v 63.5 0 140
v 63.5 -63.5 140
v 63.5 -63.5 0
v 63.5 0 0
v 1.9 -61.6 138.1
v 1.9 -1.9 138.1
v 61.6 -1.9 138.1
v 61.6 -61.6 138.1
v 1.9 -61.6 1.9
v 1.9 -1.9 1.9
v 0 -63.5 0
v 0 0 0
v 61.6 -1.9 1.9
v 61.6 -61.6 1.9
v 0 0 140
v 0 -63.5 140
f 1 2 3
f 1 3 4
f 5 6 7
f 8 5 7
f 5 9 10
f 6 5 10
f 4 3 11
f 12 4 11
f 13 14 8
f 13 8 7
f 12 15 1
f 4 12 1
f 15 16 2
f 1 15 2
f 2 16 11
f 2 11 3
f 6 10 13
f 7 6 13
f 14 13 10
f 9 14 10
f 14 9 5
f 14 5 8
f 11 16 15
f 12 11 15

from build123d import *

# Parameters (mm, degrees)
CROQUIS1_W              = 63.5
CROQUIS1_H              = 63.5
CROQUIS1_W_2            = 59.7
CROQUIS1_H_2            = 59.7
SALIENTE_EXTRUIR1_DEPTH = 140
CROQUIS2_W              = 59.7
CROQUIS2_H              = 59.7
SALIENTE_EXTRUIR2_DEPTH = 1.9
CROQUIS3_W              = 59.7
CROQUIS3_H              = 59.7
SALIENTE_EXTRUIR3_DEPTH = 1.9


with BuildPart() as part:
    # Croquis1 → Saliente-Extruir1 (new body)
    with BuildSketch(Plane.XY):
        with Locations((31.75, -31.75)):
            Rectangle(CROQUIS1_W, CROQUIS1_H)
        with Locations((31.75, -31.75)):
            Rectangle(CROQUIS1_W_2, CROQUIS1_H_2, mode=Mode.SUBTRACT)
    extrude(amount=SALIENTE_EXTRUIR1_DEPTH)

    # Croquis2 → Saliente-Extruir2 (add)
    with BuildSketch(Plane.XY.offset(140)):
        with Locations((31.75, -31.75)):
            Rectangle(CROQUIS2_W, CROQUIS2_H)
    extrude(amount=-SALIENTE_EXTRUIR2_DEPTH)

    # Croquis3 → Saliente-Extruir3 (add)
    with BuildSketch(Plane(origin=(0, 0, 0), x_dir=(-1, 0, 0), z_dir=(0, 0, -1))):
        with Locations((-31.75, -31.75)):
            Rectangle(CROQUIS3_W, CROQUIS3_H)
    extrude(amount=-SALIENTE_EXTRUIR3_DEPTH)


solid = part.part
